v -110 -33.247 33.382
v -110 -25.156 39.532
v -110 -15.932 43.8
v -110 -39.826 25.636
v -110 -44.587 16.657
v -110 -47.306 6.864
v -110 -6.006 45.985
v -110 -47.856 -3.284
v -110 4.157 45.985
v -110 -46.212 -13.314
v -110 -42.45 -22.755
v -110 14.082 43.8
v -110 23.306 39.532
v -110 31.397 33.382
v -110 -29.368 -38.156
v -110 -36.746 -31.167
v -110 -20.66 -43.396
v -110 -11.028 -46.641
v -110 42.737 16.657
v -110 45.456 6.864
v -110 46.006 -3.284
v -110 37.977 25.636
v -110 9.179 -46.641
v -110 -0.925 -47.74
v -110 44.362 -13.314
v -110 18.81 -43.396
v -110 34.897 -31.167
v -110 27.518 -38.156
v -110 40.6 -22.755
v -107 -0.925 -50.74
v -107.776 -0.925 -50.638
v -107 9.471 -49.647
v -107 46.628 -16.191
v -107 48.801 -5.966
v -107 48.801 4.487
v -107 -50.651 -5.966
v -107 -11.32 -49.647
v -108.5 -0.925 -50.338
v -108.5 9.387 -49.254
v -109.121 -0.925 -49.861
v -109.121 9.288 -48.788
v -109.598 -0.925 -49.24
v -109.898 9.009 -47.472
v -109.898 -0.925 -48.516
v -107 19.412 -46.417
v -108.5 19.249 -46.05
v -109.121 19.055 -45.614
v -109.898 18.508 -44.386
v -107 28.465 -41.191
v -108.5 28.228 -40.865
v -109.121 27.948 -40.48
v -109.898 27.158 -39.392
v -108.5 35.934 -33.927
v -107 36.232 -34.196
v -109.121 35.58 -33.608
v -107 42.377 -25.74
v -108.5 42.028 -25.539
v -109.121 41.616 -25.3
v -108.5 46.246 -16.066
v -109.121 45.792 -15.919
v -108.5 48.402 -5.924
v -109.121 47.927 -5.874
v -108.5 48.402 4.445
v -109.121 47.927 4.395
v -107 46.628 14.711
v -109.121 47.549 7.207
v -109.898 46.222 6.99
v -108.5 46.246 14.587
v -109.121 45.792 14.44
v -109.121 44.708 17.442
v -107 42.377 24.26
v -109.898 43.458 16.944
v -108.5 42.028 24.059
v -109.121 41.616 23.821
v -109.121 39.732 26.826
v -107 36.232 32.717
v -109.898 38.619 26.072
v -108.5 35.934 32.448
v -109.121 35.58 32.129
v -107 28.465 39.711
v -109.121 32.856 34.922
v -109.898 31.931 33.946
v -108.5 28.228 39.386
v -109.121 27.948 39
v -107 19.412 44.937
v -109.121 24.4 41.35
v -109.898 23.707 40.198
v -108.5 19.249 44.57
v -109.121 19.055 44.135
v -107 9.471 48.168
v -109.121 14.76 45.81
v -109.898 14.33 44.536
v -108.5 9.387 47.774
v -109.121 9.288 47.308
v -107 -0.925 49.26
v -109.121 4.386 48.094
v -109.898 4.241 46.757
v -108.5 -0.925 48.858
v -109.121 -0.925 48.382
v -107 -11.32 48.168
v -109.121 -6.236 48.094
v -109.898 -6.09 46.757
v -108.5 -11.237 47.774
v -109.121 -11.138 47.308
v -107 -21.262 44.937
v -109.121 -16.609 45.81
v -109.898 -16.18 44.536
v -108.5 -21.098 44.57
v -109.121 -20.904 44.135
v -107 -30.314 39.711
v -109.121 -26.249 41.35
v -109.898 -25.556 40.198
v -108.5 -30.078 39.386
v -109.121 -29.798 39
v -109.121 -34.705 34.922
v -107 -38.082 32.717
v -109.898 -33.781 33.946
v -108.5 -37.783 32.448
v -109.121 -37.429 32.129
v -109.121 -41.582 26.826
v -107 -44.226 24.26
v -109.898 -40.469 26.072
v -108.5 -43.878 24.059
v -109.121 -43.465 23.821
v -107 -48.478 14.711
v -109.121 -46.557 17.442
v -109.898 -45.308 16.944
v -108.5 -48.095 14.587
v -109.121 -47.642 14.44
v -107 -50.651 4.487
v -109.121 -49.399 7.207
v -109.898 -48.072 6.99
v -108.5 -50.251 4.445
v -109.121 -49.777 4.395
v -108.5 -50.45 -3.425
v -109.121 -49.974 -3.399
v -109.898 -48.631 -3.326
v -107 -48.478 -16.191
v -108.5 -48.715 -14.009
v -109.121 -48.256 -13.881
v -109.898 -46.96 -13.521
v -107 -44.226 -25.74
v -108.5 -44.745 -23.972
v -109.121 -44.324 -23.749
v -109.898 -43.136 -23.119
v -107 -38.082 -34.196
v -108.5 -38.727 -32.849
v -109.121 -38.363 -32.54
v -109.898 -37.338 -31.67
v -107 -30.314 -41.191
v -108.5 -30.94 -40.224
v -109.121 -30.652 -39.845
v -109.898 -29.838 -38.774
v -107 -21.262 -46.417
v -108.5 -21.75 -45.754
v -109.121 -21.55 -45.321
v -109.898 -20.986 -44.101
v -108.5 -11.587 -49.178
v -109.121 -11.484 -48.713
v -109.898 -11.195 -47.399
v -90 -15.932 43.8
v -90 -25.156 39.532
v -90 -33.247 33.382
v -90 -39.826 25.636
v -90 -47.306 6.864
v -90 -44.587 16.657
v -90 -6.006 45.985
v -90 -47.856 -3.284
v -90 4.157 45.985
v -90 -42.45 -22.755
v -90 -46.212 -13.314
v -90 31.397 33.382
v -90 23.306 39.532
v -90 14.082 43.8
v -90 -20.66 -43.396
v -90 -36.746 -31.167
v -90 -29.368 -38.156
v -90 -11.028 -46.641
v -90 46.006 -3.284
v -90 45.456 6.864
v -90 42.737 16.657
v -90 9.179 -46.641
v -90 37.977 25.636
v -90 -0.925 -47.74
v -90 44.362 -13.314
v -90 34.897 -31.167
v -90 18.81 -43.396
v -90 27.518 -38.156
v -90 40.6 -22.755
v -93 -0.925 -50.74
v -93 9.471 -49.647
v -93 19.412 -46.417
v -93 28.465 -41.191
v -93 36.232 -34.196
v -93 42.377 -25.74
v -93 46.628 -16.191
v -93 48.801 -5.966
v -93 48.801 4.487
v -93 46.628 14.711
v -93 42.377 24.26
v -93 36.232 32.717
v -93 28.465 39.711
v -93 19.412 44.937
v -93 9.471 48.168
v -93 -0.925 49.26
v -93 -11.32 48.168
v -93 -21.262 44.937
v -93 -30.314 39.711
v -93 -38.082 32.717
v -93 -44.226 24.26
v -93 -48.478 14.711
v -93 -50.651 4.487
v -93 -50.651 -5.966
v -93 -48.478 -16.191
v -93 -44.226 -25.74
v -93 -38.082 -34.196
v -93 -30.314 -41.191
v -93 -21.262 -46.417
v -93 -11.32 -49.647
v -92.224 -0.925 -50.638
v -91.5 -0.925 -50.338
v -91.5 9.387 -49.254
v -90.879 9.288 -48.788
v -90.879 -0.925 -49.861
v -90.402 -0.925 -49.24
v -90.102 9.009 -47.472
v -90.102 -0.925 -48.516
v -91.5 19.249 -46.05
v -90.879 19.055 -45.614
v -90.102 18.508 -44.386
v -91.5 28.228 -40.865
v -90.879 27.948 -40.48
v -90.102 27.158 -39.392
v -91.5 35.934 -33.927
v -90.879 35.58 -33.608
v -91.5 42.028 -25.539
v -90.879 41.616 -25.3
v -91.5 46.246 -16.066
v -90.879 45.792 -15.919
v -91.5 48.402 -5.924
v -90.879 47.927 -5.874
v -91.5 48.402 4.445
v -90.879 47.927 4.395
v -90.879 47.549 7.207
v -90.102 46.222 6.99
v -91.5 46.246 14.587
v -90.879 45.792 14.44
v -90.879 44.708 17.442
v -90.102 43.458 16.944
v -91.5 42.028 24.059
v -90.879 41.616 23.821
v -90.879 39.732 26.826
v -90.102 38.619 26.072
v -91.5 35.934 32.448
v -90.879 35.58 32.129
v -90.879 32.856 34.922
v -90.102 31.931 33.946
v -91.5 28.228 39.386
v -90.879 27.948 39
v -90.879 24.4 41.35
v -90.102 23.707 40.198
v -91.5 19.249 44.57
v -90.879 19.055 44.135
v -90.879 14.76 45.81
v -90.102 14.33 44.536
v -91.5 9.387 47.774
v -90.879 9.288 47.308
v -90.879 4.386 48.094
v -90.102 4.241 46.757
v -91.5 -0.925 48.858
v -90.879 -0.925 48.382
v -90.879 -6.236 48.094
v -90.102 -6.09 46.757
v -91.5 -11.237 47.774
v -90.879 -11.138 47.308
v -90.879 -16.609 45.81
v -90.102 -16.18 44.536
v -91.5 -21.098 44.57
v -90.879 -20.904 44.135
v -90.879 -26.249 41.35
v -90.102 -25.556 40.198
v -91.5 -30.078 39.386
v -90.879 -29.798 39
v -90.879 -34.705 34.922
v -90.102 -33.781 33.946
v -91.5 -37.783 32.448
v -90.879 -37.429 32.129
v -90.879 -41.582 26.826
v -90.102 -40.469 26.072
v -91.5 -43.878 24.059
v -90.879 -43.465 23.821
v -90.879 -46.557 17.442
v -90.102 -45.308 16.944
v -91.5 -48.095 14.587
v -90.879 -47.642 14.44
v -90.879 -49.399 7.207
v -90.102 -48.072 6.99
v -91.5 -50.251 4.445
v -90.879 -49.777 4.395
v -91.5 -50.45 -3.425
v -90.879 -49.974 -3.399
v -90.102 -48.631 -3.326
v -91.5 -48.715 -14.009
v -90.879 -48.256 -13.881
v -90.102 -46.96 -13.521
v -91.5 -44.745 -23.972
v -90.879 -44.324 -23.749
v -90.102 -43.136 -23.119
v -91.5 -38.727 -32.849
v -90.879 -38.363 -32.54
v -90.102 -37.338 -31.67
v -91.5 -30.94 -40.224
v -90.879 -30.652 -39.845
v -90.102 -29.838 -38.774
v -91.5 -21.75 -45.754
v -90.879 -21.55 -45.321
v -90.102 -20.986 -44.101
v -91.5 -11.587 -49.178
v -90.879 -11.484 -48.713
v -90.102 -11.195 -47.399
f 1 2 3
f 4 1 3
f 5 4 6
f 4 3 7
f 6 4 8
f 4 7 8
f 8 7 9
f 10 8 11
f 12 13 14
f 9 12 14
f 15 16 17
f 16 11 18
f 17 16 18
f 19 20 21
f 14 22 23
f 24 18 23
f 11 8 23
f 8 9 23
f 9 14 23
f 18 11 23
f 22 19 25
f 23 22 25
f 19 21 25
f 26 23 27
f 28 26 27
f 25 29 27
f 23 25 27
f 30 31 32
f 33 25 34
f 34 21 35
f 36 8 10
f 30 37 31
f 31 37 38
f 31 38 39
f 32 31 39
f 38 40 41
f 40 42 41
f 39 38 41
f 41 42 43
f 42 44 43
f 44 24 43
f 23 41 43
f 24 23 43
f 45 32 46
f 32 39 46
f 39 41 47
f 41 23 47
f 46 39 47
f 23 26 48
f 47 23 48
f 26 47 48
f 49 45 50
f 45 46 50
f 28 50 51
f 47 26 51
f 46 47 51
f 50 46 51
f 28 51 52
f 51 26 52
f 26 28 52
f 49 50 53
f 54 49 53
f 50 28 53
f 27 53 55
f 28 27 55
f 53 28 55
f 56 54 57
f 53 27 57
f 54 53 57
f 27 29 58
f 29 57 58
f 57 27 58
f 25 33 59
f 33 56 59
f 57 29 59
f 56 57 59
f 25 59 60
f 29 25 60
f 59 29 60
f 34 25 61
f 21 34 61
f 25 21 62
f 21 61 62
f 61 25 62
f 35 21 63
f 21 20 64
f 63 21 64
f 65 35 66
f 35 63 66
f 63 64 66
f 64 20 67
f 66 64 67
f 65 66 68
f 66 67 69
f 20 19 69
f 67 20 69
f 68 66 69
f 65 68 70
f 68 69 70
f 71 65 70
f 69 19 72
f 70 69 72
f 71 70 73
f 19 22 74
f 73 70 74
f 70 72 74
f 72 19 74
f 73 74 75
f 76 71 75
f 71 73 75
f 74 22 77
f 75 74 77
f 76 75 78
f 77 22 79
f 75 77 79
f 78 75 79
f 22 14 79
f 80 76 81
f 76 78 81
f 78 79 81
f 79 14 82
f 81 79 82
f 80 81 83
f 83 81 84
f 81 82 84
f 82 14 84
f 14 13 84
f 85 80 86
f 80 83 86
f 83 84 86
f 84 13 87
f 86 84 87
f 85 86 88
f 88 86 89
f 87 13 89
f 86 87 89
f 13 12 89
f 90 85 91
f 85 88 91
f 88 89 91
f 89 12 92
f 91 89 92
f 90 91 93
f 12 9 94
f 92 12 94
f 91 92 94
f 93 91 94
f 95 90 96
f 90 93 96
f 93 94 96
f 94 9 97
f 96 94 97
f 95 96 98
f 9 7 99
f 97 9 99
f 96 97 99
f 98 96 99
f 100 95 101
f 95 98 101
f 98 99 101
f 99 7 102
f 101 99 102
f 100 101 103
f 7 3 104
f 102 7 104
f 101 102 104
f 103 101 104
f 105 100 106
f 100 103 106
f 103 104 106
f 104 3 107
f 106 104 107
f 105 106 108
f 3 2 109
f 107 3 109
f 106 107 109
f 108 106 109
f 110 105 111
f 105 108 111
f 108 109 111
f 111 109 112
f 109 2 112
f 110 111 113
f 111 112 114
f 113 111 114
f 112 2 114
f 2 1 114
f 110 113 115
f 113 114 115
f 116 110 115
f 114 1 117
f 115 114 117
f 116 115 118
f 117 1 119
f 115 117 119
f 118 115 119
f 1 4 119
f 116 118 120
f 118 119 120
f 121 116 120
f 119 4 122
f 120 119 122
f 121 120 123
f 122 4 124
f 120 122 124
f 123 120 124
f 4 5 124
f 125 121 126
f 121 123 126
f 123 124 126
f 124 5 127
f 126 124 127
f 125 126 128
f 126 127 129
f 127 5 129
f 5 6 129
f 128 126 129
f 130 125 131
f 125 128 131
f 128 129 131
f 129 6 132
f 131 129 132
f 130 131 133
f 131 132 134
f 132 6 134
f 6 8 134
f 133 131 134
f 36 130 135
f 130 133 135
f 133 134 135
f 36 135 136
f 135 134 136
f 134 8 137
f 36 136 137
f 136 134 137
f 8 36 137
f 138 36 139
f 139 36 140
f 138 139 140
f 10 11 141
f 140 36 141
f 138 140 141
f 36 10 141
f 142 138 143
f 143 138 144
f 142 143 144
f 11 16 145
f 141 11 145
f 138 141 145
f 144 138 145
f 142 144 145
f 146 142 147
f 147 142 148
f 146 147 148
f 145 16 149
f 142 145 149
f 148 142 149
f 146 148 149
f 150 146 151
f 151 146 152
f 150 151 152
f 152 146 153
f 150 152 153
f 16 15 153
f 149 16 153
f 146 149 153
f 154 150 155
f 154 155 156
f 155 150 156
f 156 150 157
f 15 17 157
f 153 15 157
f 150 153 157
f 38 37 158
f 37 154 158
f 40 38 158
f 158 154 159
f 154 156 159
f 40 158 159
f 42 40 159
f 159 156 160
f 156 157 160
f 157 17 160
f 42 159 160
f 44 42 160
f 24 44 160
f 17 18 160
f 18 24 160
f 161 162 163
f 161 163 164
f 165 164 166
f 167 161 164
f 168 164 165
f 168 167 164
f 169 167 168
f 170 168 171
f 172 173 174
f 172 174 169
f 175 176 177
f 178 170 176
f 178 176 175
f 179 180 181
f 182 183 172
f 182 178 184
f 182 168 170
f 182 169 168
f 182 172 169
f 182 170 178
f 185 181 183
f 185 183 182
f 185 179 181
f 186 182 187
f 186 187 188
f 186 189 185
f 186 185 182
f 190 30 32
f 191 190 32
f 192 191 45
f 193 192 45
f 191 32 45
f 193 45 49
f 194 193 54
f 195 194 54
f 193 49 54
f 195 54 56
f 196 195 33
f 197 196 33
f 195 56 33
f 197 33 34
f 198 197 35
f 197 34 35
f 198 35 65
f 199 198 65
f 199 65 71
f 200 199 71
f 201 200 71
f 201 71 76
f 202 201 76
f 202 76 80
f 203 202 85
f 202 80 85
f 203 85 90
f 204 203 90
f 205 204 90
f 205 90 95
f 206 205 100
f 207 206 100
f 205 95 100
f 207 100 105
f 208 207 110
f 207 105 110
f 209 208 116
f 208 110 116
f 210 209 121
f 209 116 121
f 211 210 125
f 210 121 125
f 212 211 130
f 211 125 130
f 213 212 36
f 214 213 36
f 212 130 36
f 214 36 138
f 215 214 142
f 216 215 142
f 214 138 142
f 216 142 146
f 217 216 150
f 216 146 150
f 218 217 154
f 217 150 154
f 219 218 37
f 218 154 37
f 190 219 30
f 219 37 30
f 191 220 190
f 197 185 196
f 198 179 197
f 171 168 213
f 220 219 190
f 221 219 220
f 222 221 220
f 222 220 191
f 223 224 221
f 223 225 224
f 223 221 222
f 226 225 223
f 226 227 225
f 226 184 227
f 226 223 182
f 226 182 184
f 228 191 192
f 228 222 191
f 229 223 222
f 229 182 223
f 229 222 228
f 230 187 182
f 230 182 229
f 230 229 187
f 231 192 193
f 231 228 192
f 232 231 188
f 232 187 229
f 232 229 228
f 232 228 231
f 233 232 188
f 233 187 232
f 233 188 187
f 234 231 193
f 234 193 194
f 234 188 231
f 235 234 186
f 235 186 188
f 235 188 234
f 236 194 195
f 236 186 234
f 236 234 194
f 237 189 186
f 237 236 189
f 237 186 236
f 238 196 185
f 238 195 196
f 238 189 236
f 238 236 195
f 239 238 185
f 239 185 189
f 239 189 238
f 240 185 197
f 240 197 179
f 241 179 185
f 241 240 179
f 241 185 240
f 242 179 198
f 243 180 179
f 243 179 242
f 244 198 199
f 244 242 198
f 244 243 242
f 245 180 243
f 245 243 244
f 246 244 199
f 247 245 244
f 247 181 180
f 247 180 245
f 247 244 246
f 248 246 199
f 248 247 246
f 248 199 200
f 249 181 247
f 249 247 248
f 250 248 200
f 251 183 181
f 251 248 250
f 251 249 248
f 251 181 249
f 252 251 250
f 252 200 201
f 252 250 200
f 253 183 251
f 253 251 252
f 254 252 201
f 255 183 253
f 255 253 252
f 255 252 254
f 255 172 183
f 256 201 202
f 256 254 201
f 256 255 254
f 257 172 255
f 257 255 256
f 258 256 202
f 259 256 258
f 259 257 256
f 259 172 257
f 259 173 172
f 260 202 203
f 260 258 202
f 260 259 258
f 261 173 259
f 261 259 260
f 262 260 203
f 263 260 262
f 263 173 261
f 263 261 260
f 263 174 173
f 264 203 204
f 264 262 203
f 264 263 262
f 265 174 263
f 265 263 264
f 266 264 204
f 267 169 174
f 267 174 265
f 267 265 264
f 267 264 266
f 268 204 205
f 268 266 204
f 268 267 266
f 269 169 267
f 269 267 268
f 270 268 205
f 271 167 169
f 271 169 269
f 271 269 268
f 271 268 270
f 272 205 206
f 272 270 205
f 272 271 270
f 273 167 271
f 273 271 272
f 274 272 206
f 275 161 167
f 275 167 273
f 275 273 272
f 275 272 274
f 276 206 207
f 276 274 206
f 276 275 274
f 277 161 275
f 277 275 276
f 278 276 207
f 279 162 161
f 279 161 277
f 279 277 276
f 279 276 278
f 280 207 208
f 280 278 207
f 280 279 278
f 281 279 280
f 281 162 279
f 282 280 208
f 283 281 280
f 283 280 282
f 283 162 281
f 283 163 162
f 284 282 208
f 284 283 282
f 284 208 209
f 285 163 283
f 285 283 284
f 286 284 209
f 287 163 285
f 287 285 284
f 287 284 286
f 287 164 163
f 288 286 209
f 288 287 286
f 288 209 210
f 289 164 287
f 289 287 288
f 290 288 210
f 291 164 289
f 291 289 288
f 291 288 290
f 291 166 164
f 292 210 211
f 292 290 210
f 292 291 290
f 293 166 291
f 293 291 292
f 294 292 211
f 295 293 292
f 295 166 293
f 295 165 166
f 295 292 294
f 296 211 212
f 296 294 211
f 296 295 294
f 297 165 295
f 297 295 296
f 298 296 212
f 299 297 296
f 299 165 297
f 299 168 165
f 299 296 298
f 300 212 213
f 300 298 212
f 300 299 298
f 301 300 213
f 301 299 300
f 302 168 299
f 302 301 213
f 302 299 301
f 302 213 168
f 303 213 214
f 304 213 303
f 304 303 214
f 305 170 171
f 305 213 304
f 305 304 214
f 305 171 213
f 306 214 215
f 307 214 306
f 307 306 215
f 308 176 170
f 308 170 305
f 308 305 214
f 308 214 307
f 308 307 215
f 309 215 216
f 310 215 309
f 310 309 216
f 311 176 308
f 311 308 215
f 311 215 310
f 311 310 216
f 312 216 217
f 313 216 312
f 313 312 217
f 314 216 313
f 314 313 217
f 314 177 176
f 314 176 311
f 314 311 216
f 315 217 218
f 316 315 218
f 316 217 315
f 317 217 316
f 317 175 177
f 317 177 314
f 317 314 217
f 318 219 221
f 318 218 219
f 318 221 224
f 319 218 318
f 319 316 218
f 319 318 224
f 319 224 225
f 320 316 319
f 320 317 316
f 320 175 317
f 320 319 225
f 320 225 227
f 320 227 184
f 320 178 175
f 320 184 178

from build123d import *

# Parameters (mm, degrees)
SKETCH002_R  = 50
PAD002_DEPTH = 20
FILLET003_R  = 3
FILLET004_R  = 3


with BuildPart() as part:
    # Sketch002 → Pad002 (new body)
    with BuildSketch(Plane(origin=(-110, 0, 0), x_dir=(0, 0, -1), z_dir=(1, 0, 0))):
        with Locations((0.73979, -0.924742)):
            Circle(SKETCH002_R)
    extrude(amount=PAD002_DEPTH)

    # Fillet003
    fillet003_edges = [part.edges().sort_by_distance(p)[0] for p in [
        (-90, -0.924742, 49.26021),
    ]]
    fillet(fillet003_edges, radius=FILLET003_R)

    # Fillet004
    fillet004_edges = [part.edges().sort_by_distance(p)[0] for p in [
        (-110, -0.924742, 49.26021),
    ]]
    fillet(fillet004_edges, radius=FILLET004_R)


solid = part.part
